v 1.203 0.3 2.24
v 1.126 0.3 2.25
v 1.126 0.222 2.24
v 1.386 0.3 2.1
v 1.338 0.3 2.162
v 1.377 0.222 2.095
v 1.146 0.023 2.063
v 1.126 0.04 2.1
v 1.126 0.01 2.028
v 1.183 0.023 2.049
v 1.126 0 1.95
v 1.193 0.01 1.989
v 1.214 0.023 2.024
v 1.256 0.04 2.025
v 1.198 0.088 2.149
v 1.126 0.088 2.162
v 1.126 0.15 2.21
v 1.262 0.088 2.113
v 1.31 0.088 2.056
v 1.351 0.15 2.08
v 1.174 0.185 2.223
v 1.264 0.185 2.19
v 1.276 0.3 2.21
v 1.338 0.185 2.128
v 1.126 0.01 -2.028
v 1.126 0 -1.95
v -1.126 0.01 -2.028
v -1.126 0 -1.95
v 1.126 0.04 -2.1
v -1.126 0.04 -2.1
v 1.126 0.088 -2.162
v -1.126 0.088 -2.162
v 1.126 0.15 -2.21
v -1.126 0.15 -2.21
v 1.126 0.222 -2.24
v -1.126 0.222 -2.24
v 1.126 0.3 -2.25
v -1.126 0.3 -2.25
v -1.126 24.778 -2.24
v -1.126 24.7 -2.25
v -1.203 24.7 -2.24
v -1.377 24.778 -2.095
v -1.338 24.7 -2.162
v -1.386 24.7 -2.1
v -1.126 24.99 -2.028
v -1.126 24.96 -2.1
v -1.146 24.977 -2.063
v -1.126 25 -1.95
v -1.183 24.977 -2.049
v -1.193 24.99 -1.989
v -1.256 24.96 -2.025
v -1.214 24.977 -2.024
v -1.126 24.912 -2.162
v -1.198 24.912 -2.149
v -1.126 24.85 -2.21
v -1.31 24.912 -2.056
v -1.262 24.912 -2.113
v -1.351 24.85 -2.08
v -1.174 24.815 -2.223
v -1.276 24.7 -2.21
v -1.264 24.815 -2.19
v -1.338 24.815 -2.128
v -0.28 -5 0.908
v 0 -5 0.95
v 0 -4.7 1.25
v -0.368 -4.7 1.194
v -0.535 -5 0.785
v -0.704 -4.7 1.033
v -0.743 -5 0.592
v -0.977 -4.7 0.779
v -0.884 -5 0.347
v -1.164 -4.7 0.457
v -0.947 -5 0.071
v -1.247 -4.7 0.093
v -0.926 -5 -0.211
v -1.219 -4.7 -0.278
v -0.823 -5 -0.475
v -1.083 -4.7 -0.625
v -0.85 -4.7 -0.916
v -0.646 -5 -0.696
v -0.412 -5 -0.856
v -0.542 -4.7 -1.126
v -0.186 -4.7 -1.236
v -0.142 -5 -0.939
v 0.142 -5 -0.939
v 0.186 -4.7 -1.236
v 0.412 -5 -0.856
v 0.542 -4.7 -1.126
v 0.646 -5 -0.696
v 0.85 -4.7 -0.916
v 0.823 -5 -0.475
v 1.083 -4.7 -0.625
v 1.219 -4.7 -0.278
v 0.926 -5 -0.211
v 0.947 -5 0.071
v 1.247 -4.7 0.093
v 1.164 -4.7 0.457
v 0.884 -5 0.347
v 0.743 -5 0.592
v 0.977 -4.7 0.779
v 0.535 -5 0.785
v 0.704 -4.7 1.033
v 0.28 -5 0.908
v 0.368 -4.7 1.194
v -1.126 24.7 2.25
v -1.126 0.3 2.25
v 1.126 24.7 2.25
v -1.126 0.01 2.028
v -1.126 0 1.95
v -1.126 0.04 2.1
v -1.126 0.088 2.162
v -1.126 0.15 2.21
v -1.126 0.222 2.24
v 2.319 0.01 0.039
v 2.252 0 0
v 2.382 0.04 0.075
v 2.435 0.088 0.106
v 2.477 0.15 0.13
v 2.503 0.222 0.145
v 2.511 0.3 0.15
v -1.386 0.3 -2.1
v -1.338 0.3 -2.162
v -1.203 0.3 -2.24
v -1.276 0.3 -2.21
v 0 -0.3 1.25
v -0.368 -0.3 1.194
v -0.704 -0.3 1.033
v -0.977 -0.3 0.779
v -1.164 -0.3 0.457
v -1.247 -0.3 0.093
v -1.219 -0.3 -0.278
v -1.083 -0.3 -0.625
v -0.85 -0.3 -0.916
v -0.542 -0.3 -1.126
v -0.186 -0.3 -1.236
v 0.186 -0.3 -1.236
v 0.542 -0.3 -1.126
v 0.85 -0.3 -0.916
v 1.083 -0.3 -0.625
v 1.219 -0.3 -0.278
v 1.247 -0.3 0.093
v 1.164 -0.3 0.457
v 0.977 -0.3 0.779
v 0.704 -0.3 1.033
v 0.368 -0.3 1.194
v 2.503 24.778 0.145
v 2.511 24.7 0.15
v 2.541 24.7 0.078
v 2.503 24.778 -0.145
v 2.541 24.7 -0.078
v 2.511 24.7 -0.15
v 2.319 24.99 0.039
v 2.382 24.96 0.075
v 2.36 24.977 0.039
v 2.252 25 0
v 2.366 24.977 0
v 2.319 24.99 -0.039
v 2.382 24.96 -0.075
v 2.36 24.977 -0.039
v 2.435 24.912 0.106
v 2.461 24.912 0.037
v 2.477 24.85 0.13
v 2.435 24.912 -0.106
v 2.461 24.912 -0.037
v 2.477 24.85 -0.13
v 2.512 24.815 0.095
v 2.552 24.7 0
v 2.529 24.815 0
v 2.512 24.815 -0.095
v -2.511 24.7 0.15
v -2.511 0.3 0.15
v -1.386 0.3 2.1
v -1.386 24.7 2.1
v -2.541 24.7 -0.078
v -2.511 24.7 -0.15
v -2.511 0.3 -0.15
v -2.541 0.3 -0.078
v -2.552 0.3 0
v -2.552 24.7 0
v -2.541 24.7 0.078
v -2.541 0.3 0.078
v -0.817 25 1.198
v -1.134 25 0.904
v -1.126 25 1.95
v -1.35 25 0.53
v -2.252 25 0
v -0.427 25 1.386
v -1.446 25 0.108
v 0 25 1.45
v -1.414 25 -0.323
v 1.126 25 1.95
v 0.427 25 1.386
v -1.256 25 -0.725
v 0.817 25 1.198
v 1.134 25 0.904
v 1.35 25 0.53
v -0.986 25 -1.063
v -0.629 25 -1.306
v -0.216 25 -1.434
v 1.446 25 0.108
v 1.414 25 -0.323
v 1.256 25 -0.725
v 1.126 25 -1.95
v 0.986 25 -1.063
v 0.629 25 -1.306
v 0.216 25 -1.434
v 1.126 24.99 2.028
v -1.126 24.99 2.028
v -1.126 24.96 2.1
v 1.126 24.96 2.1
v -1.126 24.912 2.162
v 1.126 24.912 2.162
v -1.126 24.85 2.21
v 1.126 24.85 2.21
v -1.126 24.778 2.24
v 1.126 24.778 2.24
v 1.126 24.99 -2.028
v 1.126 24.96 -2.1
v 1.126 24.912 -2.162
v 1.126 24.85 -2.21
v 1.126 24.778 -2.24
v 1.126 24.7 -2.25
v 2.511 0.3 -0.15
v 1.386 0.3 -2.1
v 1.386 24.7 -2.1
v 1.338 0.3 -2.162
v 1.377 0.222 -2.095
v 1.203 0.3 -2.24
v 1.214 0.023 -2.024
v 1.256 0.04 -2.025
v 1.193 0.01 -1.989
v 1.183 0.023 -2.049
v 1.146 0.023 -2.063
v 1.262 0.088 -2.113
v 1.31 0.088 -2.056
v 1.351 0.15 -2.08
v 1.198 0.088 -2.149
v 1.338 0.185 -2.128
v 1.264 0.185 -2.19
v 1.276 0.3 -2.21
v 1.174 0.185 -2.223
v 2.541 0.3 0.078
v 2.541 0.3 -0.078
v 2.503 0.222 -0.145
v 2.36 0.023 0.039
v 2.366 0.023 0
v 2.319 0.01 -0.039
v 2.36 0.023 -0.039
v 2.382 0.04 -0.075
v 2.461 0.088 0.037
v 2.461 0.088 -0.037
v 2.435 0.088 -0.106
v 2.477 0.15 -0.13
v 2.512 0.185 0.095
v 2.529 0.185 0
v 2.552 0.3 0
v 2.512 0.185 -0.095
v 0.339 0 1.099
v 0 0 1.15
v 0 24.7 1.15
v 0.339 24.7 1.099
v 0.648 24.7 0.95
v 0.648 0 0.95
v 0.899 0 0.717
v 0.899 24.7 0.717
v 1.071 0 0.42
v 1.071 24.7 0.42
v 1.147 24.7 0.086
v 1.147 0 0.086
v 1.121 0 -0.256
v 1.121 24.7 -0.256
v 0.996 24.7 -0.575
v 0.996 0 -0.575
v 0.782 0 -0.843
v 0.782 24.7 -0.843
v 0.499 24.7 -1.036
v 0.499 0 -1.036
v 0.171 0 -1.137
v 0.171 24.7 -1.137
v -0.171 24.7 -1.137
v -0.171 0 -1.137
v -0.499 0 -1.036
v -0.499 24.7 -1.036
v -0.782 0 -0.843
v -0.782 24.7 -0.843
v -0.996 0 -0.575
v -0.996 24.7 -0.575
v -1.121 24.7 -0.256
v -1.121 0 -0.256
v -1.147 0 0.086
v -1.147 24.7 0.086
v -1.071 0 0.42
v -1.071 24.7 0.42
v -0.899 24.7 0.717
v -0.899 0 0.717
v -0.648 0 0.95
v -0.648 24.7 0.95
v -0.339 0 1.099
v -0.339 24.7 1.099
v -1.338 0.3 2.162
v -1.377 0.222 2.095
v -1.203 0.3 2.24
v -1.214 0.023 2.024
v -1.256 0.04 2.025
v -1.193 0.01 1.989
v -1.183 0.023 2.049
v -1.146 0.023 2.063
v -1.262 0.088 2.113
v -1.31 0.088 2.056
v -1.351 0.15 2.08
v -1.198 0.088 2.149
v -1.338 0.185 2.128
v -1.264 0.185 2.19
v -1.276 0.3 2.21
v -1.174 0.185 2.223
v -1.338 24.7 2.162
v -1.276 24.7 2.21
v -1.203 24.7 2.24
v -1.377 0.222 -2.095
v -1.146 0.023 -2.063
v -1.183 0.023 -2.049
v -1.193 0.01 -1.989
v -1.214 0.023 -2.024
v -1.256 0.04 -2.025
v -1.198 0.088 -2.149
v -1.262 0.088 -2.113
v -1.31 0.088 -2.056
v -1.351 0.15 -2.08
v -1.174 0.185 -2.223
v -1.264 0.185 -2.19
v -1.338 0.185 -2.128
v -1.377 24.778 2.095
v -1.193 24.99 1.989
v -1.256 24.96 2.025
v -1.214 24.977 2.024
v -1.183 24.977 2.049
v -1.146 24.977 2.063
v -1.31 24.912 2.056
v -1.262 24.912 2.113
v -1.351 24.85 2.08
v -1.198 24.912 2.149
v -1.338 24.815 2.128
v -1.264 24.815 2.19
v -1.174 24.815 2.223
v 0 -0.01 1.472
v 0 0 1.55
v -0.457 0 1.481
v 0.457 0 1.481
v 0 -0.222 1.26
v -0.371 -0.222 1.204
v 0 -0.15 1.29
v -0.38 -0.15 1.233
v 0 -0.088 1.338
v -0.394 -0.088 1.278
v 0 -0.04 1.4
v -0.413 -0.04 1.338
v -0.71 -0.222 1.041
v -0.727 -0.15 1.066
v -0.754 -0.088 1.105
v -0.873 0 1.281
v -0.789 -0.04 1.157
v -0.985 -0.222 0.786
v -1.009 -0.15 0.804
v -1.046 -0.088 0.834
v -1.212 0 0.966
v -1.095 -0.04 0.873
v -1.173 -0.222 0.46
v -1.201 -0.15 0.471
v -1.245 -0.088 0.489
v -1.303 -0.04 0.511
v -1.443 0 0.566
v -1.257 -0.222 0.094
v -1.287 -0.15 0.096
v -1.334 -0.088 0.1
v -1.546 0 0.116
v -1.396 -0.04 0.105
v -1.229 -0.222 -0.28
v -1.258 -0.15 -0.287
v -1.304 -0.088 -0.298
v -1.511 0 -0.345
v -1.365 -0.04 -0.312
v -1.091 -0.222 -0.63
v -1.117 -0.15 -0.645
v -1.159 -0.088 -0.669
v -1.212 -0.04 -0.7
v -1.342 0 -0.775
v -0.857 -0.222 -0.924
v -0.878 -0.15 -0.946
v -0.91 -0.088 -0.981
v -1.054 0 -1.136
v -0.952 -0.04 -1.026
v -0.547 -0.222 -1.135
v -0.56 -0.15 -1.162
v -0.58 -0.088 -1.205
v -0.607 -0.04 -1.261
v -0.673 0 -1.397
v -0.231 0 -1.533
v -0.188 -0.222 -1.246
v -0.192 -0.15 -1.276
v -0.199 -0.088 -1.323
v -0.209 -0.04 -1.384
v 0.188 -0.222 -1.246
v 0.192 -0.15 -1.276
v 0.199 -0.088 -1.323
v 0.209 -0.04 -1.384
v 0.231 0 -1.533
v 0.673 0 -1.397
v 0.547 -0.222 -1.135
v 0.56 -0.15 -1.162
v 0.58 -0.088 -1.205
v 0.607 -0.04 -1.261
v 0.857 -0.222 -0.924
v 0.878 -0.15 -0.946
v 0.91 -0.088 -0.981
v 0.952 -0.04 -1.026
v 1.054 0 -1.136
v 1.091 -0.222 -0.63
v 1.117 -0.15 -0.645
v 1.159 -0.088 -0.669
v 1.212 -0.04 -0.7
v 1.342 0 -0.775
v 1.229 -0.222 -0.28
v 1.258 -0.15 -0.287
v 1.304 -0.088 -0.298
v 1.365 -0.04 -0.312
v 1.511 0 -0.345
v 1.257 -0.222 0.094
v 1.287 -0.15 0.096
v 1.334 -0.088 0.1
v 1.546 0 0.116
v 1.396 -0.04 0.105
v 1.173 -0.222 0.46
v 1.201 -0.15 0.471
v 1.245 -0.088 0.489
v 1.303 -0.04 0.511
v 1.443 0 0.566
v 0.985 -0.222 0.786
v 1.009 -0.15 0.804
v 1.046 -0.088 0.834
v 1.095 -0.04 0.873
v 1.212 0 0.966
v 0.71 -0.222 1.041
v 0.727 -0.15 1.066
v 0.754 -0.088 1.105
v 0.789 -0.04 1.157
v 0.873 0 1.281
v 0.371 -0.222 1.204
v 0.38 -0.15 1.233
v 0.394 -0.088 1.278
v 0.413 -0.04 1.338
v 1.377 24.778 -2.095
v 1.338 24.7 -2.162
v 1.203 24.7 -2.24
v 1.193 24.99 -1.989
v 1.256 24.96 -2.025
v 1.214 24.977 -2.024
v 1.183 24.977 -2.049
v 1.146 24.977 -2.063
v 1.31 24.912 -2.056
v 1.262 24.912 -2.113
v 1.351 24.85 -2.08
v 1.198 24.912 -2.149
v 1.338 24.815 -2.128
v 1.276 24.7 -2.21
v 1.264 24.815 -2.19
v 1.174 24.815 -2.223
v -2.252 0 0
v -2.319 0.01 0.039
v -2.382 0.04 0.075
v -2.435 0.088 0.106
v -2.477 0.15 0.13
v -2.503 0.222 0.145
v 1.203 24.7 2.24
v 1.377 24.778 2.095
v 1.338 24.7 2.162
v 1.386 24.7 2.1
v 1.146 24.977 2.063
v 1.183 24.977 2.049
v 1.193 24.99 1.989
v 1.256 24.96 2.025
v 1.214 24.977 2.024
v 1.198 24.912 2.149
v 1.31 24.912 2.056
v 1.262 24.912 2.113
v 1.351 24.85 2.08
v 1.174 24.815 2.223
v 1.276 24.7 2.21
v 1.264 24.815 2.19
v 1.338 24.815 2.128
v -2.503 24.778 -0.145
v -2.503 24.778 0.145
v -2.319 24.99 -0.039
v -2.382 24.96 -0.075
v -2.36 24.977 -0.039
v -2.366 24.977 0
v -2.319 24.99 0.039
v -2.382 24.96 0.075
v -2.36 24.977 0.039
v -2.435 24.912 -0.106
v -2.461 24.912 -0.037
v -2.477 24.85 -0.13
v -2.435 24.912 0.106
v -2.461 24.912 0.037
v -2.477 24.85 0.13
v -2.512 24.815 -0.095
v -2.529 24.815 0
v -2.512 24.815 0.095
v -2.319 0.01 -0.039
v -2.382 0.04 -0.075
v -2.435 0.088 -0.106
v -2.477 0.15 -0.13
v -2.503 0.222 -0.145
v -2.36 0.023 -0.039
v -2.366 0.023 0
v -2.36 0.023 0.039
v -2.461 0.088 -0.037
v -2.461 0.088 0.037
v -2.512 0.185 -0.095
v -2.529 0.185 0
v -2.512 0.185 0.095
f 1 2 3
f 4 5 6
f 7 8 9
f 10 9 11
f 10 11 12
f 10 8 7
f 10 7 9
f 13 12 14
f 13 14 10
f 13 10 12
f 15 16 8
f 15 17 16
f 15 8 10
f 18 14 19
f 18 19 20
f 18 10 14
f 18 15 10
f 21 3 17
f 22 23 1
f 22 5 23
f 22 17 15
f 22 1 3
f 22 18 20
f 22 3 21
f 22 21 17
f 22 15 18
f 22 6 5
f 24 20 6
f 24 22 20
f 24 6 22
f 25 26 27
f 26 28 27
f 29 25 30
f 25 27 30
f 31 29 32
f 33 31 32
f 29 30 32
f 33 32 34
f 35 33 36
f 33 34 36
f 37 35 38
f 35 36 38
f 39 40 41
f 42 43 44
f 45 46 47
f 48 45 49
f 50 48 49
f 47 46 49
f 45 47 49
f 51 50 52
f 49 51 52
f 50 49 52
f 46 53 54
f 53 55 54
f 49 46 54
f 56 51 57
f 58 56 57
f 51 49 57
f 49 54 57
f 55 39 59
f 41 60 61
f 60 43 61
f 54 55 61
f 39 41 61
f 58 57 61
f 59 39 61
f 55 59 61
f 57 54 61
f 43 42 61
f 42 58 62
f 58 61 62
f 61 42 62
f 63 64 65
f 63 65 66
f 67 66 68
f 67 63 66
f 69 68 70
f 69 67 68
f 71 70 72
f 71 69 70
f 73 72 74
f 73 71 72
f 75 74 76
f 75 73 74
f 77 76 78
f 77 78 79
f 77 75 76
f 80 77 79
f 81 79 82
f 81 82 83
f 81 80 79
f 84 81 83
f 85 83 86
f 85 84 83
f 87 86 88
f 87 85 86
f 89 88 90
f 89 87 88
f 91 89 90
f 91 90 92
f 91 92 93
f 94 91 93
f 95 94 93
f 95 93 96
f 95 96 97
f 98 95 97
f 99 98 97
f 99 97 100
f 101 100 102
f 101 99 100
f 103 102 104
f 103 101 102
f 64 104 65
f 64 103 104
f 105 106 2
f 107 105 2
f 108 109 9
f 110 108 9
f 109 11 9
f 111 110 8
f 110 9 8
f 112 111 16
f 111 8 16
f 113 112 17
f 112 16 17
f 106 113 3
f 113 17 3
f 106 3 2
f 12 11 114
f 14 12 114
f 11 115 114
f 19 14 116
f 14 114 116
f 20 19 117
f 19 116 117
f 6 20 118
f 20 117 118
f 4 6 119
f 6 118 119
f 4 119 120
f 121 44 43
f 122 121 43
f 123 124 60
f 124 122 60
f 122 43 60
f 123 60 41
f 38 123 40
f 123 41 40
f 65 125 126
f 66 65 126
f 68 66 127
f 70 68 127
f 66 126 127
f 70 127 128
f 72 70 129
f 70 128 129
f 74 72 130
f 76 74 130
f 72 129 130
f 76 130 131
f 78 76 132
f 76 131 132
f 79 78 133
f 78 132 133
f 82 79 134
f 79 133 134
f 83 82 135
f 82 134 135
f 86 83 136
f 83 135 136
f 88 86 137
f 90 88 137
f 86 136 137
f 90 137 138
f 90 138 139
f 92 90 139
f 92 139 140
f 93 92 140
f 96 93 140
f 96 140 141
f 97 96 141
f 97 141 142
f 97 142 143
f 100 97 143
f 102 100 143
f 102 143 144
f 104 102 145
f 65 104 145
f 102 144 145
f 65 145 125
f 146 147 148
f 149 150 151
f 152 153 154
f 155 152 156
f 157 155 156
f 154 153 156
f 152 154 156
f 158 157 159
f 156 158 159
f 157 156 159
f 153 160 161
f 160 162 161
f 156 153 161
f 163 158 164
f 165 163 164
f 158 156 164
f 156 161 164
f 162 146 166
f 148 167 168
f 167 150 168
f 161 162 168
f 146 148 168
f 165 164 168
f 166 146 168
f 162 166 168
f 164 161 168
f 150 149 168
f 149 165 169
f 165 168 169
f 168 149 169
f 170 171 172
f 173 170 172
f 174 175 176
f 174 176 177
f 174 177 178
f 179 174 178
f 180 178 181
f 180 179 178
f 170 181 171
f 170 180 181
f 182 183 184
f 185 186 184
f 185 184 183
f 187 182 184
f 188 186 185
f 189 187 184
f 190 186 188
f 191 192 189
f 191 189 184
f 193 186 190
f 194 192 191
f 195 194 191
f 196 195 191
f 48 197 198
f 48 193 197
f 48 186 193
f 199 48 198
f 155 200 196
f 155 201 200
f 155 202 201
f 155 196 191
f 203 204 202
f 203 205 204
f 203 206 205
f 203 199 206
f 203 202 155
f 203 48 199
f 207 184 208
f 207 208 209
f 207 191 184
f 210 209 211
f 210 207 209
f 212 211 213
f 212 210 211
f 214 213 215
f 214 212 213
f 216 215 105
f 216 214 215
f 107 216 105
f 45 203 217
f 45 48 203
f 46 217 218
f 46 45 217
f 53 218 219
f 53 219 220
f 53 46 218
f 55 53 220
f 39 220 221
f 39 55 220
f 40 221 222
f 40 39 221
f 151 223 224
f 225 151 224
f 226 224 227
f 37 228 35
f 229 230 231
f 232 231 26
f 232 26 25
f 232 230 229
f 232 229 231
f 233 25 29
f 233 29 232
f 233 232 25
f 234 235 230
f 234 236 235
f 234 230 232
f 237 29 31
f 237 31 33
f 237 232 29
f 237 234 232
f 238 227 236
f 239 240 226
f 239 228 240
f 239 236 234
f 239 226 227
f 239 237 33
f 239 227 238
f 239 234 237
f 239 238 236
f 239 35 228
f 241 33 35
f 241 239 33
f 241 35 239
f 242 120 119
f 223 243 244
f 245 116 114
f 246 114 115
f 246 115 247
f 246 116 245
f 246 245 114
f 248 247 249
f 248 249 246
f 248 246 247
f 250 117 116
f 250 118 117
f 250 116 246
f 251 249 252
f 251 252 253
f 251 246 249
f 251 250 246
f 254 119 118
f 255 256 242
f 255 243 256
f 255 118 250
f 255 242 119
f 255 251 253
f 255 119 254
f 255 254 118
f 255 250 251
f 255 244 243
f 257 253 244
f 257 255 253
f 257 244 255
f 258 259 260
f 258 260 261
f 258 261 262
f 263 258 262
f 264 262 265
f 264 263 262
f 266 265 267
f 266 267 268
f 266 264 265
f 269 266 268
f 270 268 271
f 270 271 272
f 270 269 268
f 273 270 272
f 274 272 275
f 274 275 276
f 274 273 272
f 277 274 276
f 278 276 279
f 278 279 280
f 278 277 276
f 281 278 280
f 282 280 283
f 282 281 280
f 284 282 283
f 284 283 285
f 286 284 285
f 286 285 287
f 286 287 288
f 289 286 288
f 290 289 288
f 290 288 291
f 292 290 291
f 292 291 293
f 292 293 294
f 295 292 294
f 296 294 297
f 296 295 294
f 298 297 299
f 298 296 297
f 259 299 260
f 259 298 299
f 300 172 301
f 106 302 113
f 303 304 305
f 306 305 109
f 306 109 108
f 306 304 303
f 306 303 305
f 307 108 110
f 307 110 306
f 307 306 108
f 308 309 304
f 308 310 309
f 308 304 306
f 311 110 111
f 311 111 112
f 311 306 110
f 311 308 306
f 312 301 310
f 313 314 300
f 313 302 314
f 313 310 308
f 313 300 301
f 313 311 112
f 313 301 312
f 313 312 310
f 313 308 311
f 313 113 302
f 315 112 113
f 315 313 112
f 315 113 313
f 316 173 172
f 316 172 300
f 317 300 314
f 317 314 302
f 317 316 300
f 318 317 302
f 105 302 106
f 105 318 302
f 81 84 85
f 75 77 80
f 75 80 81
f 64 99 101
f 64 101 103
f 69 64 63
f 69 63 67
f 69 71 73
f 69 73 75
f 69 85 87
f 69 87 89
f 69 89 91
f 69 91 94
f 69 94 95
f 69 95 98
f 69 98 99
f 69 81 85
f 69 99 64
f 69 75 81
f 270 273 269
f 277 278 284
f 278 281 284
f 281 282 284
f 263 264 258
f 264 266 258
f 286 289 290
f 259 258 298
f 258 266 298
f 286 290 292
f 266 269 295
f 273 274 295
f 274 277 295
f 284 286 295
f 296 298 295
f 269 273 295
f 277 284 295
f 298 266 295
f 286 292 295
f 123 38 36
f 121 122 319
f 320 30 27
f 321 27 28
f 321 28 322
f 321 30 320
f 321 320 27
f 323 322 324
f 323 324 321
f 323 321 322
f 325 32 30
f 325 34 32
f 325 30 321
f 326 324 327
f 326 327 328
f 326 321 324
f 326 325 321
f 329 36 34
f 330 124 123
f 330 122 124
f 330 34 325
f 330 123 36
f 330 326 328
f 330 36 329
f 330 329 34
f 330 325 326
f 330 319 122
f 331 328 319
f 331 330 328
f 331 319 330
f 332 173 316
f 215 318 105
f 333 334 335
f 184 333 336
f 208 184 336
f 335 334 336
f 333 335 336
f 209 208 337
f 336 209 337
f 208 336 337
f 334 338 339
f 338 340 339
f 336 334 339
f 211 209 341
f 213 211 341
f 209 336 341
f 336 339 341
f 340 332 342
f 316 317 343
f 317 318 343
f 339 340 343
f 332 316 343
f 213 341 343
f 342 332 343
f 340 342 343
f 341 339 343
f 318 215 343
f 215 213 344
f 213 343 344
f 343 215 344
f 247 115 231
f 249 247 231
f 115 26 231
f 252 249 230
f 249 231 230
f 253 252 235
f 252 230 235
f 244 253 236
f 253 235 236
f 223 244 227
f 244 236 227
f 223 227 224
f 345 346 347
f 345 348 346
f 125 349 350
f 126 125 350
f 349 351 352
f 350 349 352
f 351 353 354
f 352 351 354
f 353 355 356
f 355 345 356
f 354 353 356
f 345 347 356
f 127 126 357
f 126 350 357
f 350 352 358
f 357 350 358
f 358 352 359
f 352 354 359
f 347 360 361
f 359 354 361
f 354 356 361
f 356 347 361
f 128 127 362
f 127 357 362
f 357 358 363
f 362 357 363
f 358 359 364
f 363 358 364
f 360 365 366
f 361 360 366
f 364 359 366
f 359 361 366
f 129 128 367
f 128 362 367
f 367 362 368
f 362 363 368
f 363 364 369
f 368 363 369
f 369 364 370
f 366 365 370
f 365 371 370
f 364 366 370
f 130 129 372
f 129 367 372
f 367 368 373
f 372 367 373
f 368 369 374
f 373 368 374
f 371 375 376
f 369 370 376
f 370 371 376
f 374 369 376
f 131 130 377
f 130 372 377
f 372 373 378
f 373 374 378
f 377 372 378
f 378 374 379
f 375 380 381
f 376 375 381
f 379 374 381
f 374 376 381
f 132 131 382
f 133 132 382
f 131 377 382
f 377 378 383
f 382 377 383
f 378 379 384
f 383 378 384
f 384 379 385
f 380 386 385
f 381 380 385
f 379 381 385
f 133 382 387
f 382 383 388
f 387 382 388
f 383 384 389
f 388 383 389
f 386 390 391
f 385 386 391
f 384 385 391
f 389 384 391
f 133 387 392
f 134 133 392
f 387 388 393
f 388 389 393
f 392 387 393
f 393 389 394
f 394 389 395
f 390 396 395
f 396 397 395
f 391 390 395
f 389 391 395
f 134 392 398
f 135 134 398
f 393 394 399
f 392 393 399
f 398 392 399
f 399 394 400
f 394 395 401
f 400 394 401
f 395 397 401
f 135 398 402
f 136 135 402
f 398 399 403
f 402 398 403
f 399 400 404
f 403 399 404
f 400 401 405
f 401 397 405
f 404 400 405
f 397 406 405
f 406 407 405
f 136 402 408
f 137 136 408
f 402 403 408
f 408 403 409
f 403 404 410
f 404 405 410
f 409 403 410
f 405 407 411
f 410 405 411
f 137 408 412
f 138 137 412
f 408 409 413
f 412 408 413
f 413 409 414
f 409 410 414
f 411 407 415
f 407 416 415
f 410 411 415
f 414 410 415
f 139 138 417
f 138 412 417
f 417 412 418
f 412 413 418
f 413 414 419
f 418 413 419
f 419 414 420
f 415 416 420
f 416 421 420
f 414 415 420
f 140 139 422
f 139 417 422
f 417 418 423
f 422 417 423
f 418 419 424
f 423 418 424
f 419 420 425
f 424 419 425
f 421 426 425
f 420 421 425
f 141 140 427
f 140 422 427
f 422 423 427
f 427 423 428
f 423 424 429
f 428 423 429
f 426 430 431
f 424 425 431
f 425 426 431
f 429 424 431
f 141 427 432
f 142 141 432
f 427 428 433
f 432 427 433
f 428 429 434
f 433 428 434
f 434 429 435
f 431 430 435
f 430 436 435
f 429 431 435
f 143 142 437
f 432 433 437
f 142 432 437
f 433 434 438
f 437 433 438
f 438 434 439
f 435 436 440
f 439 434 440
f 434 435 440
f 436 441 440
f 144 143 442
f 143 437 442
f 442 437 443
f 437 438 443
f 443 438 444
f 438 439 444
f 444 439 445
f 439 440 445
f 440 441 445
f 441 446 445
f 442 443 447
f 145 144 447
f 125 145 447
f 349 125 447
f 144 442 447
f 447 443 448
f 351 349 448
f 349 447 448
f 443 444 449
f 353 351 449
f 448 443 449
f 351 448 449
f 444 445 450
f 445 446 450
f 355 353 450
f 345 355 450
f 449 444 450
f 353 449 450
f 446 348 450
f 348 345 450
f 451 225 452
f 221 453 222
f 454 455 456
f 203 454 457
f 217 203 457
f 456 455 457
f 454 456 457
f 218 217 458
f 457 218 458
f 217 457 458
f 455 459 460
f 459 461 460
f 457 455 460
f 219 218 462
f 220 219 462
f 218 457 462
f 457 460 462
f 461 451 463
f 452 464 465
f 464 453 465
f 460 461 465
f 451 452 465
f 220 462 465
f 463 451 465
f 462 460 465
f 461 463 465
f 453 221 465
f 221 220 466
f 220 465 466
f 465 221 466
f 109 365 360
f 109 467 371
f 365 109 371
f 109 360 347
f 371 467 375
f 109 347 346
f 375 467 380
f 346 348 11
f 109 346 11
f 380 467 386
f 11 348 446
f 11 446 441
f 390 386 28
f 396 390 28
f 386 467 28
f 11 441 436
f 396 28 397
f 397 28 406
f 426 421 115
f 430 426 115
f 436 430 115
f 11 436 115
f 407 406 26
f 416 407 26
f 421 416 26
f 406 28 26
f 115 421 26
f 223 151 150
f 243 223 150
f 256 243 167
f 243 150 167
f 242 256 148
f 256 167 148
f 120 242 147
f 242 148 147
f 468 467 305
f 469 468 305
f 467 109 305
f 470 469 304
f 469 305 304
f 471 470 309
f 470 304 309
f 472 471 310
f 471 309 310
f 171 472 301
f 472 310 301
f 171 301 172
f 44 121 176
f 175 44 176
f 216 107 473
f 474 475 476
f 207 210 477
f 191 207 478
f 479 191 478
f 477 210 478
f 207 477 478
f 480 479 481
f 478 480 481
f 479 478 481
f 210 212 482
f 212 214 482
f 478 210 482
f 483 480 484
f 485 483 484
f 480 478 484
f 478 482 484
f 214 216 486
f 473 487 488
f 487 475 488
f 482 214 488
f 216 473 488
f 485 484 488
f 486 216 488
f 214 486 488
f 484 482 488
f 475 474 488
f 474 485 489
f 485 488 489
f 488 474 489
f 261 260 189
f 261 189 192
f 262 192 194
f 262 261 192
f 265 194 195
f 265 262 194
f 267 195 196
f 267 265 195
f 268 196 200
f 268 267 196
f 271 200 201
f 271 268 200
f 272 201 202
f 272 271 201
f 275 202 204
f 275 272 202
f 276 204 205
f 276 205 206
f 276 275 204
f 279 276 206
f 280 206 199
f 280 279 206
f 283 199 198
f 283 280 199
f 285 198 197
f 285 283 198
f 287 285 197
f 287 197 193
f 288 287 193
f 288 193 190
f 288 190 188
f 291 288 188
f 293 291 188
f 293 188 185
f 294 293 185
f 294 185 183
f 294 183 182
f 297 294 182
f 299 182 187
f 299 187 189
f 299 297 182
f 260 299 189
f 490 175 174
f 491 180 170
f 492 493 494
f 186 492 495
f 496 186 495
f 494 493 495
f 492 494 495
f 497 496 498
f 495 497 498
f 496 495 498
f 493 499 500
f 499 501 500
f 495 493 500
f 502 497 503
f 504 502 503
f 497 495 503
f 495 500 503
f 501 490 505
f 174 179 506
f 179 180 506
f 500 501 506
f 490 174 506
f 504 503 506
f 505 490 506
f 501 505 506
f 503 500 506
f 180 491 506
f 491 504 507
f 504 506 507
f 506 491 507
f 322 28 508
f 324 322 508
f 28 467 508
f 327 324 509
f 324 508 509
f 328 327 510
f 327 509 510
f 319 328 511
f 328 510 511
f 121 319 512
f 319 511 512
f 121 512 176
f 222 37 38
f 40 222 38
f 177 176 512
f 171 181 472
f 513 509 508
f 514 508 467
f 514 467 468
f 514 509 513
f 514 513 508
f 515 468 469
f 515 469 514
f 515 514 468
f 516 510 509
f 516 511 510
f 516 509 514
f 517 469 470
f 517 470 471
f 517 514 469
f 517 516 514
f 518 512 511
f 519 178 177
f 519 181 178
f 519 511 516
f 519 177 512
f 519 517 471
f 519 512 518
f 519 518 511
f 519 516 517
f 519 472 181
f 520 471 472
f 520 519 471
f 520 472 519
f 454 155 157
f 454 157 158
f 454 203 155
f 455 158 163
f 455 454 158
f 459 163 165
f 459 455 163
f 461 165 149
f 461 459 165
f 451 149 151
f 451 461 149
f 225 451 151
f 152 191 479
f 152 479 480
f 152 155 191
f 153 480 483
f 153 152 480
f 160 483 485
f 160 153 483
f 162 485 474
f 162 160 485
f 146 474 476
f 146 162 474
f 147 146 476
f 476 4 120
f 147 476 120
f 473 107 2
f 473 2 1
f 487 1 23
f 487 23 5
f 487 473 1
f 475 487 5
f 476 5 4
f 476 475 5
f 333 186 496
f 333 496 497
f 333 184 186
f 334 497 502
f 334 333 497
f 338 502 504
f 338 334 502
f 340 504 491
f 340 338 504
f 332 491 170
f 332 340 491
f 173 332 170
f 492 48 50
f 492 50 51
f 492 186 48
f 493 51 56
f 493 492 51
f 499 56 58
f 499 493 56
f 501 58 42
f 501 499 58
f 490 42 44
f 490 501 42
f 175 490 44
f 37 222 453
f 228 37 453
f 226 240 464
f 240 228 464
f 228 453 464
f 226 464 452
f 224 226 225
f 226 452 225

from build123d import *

# Parameters (mm, degrees)
SKETCH1_R           = 1.15
BOSS_EXTRUDE1_DEPTH = 25
FILLET1_R           = 0.3
FILLET2_R           = 0.3
SKETCH2_R           = 1.25
BOSS_EXTRUDE2_DEPTH = 5
CHAMFER1_SIZE       = 0.3
FILLET3_R           = 0.3


with BuildPart() as part:
    # Sketch1 → Boss-Extrude1 (new body)
    with BuildSketch(Plane(origin=(0, 0, 0), x_dir=(1, 0, 0), z_dir=(0, 1, 0))):
        Polygon((-1.299038106, 2.25), (-2.598076211, 0), (-1.299038106, -2.25), (1.299038106, -2.25), (2.598076211, 0), (1.299038106, 2.25), align=None)
        with Locations(Location((0, 0, 0), (0, 0, 270))):
            Circle(SKETCH1_R, mode=Mode.SUBTRACT)
    extrude(amount=BOSS_EXTRUDE1_DEPTH)

    # Fillet1
    fillet1_edges = [part.edges().sort_by_distance(p)[0] for p in [
        (1.299038106, 12.5, -2.25),
        (2.598076211, 12.5, 0),
        (1.299038106, 12.5, 2.25),
        (-1.299038106, 12.5, 2.25),
        (-2.598076211, 12.5, 0),
        (-1.299038106, 12.5, -2.25),
    ]]
    fillet(fillet1_edges, radius=FILLET1_R)

    # Fillet2
    fillet2_edges = [part.edges().sort_by_distance(p)[0] for p in [
        (0, 0, -2.25),
        (0, 25, -2.25),
        (1.948557159, 0, -1.125),
        (1.948557159, 0, 1.125),
        (0, 0, 2.25),
        (-1.948557159, 0, 1.125),
        (-1.948557159, 0, -1.125),
        (1.275833025, 0, 2.209807621),
        (-1.275833025, 0, 2.209807621),
        (-2.55166605, 0, 0),
        (-1.275833025, 0, -2.209807621),
        (2.55166605, 0, 0),
        (1.275833025, 0, -2.209807621),
        (1.948557159, 25, -1.125),
        (-1.948557159, 25, -1.125),
        (-1.948557159, 25, 1.125),
        (0, 25, 2.25),
        (1.948557159, 25, 1.125),
        (1.275833025, 25, 2.209807621),
        (-1.275833025, 25, 2.209807621),
        (-2.55166605, 25, 0),
        (-1.275833025, 25, -2.209807621),
        (2.55166605, 25, 0),
        (1.275833025, 25, -2.209807621),
    ]]
    fillet(fillet2_edges, radius=FILLET2_R)

    # Sketch2 → Boss-Extrude2 (add)
    with BuildSketch(Plane.XZ):
        with Locations(Location((0, 0, 0), (0, 0, 90))):
            Circle(SKETCH2_R)
    extrude(amount=BOSS_EXTRUDE2_DEPTH)

    # Chamfer1
    chamfer1_edges = [part.edges().sort_by_distance(p)[0] for p in [
        (0, -5, -1.25),
        (0, 25, -1.15),
    ]]
    chamfer(chamfer1_edges, length=CHAMFER1_SIZE)

    # Fillet3
    fillet3_edges = [part.edges().sort_by_distance(p)[0] for p in [
        (0, 0, -1.25),
    ]]
    fillet(fillet3_edges, radius=FILLET3_R)


solid = part.part
